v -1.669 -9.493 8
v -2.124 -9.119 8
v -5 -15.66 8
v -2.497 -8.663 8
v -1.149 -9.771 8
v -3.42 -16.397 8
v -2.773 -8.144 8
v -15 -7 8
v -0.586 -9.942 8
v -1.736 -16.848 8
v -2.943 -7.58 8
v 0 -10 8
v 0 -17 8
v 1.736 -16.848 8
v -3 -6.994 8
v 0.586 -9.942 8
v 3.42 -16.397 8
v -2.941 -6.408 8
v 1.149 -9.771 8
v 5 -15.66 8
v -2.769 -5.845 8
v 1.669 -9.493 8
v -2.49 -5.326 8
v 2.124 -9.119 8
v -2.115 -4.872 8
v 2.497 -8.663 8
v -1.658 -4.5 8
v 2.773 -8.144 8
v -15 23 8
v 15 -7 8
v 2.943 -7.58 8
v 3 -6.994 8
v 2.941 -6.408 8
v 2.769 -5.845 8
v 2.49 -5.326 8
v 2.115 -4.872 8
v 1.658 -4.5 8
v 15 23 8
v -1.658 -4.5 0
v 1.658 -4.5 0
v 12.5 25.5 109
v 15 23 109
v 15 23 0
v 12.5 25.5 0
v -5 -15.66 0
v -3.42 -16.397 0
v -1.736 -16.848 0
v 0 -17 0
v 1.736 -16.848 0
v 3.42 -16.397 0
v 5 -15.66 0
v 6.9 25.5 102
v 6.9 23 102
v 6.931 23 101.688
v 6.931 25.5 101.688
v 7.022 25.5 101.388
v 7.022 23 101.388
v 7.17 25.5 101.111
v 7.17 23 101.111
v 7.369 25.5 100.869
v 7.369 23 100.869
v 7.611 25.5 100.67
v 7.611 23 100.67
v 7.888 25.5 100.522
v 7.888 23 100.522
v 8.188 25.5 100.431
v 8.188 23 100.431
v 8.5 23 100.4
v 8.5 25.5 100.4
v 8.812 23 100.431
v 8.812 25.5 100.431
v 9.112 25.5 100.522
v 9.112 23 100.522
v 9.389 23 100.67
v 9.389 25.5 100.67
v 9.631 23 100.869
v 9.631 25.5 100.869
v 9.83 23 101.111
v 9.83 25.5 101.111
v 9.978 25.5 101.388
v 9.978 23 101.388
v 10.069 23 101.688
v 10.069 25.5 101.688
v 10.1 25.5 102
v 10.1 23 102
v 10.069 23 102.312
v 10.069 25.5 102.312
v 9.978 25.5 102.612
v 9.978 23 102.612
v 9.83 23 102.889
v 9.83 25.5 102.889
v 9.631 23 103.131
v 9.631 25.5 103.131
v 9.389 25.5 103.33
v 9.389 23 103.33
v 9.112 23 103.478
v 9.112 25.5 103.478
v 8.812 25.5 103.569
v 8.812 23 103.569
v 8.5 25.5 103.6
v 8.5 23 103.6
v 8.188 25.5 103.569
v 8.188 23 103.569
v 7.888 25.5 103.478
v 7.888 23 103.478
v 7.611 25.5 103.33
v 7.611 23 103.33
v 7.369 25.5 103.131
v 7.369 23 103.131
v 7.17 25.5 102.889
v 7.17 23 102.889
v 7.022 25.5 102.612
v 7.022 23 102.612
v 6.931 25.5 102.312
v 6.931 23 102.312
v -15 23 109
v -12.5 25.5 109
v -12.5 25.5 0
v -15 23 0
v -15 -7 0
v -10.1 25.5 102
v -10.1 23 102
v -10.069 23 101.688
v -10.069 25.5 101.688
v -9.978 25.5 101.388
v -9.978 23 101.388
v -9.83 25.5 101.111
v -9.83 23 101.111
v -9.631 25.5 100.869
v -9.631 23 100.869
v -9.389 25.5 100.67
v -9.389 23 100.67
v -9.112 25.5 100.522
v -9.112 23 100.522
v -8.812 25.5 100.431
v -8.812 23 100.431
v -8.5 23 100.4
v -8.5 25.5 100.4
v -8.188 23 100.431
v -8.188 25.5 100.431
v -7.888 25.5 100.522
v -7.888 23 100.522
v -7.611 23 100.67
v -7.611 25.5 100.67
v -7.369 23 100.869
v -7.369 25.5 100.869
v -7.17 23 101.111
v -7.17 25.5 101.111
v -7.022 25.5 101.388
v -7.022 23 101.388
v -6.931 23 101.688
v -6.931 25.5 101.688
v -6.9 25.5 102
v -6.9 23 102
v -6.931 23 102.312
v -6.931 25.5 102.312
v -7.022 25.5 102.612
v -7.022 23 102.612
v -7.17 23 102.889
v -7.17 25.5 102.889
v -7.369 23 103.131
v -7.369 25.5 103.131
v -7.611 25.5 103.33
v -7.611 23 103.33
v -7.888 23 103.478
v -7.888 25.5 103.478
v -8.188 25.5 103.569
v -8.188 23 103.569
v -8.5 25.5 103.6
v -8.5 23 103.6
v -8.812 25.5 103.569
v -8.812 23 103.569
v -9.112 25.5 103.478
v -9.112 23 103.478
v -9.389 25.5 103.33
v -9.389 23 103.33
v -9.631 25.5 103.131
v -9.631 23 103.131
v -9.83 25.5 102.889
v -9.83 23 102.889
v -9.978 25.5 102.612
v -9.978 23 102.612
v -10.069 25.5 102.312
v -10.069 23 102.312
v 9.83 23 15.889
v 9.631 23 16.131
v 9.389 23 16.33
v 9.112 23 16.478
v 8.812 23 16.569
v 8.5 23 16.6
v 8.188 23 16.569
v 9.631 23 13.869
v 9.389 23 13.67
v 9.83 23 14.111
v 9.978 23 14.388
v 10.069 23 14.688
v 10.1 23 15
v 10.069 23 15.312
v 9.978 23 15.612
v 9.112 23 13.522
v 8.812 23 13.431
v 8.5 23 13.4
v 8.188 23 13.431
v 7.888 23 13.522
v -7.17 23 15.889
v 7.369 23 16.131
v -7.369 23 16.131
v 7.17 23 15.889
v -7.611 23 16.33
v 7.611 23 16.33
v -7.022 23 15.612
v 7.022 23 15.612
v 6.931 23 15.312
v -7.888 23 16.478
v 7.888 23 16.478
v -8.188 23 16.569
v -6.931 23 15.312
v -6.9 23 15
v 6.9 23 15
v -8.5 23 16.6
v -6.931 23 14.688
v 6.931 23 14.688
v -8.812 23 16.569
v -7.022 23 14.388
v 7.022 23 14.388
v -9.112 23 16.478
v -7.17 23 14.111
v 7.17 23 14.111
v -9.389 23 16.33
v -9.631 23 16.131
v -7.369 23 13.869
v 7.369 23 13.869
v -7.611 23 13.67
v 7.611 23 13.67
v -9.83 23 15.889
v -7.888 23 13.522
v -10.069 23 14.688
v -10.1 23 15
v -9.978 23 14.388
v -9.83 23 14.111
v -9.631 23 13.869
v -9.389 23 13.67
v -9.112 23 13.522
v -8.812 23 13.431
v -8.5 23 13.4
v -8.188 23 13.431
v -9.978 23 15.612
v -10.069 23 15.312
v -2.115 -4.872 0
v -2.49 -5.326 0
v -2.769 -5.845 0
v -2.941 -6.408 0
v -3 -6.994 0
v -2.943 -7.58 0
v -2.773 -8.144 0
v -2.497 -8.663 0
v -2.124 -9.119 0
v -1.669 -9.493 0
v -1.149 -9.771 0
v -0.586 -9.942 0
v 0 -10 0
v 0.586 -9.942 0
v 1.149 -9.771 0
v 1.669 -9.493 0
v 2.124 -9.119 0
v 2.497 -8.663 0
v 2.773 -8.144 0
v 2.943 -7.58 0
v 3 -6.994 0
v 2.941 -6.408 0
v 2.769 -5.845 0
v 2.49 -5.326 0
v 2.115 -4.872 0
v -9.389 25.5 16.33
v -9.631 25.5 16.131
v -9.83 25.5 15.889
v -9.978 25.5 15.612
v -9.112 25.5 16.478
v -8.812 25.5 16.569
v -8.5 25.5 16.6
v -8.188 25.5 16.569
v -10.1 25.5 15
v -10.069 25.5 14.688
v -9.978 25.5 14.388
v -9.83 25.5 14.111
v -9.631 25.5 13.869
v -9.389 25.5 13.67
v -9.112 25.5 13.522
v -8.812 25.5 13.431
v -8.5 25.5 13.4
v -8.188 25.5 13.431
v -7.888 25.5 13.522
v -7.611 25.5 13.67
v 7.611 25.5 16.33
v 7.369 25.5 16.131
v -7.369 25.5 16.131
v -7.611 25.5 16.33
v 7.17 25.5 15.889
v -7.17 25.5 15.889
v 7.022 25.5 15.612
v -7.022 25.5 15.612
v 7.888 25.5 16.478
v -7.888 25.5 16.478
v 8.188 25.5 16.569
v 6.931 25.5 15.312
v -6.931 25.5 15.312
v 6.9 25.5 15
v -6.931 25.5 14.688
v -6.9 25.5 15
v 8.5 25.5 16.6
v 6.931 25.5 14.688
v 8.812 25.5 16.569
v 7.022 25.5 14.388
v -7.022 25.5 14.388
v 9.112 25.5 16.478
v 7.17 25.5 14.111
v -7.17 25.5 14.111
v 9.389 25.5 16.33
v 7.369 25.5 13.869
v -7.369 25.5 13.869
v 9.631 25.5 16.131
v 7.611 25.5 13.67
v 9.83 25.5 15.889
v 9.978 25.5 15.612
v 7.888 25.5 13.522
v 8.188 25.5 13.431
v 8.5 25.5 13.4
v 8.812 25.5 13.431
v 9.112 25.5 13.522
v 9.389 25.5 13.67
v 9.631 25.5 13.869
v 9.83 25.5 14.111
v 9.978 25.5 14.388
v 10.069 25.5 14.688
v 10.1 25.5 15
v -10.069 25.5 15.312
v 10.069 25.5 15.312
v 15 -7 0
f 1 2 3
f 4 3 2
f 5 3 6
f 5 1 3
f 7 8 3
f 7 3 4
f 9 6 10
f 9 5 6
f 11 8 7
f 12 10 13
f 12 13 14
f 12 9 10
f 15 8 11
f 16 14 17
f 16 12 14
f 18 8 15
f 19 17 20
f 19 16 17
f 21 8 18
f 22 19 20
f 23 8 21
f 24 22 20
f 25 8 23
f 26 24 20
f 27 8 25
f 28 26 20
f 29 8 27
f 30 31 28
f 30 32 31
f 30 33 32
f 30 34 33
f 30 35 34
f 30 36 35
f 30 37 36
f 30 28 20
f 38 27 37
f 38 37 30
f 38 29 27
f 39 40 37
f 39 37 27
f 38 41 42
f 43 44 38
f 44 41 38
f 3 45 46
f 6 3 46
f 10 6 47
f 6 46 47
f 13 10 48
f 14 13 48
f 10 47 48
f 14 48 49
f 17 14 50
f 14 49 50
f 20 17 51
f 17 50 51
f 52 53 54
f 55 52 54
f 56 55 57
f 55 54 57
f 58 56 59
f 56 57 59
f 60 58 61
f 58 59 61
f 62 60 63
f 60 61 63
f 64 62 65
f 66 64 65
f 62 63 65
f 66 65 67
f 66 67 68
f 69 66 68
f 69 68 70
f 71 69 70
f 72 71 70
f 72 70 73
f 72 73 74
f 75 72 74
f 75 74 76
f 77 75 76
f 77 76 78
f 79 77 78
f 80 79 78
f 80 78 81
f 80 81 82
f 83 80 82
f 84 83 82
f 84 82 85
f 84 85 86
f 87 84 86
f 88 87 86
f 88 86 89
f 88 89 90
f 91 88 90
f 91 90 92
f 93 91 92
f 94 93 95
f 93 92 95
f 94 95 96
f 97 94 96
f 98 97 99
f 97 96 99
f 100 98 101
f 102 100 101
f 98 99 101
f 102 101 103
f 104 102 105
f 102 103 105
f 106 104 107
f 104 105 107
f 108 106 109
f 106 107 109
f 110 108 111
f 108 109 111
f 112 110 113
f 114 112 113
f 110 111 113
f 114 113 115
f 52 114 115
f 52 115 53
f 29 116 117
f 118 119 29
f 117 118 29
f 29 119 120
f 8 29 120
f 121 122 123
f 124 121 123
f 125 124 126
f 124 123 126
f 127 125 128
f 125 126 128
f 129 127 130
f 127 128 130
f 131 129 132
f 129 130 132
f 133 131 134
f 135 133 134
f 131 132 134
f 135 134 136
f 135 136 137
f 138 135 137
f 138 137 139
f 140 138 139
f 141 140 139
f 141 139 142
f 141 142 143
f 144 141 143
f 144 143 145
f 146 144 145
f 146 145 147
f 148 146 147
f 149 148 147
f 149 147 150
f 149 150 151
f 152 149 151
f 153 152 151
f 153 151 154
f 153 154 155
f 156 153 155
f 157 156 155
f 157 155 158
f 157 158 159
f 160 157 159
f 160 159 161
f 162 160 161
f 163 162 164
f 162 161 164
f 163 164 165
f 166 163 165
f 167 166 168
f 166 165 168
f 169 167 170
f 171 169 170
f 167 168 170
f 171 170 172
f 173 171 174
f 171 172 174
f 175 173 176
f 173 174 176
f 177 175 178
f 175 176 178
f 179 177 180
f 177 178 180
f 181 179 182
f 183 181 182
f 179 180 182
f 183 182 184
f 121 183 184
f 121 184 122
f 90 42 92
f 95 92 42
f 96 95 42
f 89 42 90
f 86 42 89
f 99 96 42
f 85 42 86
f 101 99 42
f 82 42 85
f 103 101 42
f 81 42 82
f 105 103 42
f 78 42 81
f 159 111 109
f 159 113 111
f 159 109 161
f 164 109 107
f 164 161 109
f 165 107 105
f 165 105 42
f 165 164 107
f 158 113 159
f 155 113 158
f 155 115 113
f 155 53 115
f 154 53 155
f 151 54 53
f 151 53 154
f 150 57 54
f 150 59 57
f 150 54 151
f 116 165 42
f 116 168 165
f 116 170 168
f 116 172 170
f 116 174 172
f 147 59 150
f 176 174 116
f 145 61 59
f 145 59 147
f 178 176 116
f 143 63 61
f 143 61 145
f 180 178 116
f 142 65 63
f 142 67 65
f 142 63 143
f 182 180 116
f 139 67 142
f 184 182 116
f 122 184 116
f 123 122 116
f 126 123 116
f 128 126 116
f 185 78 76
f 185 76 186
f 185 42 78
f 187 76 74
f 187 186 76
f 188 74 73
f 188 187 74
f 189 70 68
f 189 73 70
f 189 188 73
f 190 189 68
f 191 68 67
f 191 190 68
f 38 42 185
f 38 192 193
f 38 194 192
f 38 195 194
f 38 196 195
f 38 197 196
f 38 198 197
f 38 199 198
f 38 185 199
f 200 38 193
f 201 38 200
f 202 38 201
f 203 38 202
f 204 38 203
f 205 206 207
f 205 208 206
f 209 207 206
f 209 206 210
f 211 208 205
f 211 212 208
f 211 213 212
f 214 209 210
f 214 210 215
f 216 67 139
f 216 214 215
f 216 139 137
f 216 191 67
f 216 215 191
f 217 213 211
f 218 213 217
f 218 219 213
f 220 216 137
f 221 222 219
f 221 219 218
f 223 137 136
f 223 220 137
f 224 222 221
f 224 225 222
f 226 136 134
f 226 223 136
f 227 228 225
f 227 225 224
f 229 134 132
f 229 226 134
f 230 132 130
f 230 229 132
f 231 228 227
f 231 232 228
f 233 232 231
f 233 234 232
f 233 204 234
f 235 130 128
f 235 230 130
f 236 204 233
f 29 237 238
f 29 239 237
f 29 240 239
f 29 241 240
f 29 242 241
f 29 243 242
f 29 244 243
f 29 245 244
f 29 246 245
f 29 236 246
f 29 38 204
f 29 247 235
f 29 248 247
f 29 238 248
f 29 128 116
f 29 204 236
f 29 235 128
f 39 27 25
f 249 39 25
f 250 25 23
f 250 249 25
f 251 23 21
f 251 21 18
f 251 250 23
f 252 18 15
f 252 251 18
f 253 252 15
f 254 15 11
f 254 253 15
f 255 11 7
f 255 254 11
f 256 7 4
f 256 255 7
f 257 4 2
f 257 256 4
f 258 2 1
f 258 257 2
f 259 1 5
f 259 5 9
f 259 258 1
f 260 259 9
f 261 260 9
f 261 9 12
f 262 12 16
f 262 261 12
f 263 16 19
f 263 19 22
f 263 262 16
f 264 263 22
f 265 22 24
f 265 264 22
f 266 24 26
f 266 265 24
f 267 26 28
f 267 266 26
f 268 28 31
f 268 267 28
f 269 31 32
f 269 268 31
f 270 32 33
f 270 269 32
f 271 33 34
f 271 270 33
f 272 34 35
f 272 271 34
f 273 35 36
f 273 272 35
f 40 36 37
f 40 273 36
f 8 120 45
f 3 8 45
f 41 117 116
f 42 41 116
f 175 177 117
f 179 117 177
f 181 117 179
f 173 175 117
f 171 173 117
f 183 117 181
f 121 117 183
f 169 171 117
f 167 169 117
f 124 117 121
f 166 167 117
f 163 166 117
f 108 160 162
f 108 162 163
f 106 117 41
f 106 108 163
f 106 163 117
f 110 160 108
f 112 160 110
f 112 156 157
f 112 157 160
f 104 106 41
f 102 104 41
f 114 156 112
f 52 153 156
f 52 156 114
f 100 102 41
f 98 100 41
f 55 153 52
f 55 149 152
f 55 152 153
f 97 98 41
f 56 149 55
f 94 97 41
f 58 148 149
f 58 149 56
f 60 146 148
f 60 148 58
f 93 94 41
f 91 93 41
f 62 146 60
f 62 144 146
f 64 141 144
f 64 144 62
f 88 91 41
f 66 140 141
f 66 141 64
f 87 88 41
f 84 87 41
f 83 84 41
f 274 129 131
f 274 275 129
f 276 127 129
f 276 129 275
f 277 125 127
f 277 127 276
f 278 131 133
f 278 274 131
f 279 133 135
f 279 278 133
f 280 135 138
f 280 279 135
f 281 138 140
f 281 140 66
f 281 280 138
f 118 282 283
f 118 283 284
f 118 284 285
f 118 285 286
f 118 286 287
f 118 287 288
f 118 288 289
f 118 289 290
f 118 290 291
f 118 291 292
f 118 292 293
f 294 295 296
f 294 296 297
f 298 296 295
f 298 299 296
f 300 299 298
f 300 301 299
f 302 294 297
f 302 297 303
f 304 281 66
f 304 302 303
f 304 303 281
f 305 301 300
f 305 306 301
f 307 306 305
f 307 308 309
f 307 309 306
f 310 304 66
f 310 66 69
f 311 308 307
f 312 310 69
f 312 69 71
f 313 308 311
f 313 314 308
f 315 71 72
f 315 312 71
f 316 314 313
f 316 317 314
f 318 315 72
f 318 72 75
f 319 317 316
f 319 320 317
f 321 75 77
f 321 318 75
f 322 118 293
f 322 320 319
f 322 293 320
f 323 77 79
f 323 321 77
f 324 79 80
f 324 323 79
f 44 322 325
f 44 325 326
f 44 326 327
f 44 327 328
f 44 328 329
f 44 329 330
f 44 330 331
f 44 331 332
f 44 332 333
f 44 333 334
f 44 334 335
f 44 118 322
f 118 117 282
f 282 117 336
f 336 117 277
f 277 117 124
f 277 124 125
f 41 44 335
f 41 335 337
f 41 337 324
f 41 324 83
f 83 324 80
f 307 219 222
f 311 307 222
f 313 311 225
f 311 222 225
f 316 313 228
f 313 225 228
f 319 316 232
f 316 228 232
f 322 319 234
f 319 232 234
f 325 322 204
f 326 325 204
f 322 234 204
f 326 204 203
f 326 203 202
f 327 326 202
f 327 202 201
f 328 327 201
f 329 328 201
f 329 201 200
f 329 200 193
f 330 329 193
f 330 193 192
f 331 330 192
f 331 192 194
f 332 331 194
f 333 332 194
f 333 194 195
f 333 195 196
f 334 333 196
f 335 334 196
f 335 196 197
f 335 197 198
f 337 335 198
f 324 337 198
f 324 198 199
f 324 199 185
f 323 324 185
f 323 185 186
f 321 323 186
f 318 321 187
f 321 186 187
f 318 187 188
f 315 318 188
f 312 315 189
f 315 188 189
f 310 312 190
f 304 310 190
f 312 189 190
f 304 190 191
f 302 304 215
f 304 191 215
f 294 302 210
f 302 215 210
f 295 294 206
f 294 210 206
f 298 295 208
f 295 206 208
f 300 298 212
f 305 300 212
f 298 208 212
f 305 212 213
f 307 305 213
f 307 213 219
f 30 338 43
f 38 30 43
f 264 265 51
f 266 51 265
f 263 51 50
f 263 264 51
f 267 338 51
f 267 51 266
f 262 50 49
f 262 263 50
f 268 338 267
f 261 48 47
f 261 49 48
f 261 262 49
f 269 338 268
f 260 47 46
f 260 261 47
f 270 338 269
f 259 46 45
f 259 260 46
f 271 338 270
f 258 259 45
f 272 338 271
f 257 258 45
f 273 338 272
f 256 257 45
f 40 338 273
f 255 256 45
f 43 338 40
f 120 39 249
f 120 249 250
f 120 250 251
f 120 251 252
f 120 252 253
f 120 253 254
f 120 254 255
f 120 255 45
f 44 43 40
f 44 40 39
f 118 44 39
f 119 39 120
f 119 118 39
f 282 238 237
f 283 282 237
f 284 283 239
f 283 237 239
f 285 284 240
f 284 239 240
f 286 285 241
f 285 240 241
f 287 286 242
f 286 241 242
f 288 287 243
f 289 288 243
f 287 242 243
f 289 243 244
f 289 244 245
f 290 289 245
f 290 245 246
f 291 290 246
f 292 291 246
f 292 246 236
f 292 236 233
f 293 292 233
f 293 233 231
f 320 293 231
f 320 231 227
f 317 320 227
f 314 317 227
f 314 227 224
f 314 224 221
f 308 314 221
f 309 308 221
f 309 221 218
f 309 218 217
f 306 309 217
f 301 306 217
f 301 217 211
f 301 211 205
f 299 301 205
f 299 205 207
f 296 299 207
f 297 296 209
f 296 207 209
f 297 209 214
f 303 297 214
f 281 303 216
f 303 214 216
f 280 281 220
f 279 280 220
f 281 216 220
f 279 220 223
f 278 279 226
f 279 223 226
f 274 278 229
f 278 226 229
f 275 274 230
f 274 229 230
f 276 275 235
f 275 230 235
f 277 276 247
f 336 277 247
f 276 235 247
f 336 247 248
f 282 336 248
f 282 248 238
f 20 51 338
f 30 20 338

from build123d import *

# Parameters (mm, degrees)
BOSS_EXTRUDE1_DEPTH  = 8
BOSS_EXTRUDE3_DEPTH  = 109
M3_CLEARANCE_SLOT1_D = 3.2


with BuildPart() as part:
    # Sketch1 → Boss-Extrude1 (new body)
    with BuildSketch(Plane.XY):
        with BuildLine():
            Line((15, 23), (-15, 23))
            Line((-15, 23), (-15, -7))
            Line((-15, -7), (-5, -15.660254038))
            ThreePointArc((-5, -15.660254038), (0, -17), (5, -15.660254038))
            Line((5, -15.660254038), (15, -7))
            Line((15, -7), (15, 23))
        make_face()
        with BuildLine():
            Line((1.658312395, -4.5), (-1.658312395, -4.5))
            ThreePointArc((-1.658312395, -4.5), (0, -10), (1.658312395, -4.5))
        make_face(mode=Mode.SUBTRACT)
    extrude(amount=BOSS_EXTRUDE1_DEPTH)

    # Sketch1<5> → Boss-Extrude3 (add)
    with BuildSketch(Plane.XY):
        Polygon((-12.5, 25.5), (12.5, 25.5), (15, 23), (-15, 23), align=None)
    extrude(amount=BOSS_EXTRUDE3_DEPTH)

    # M3 Clearance Slot1 (through all)
    with Locations(Plane(origin=(0, 25.5, 0), x_dir=(1, 0, 0), z_dir=(0, 1, 0))):
        with Locations((-8.5, -15), (8.5, -15), (-8.5, -102), (8.5, -102)):
            Hole(M3_CLEARANCE_SLOT1_D / 2)


solid = part.part
